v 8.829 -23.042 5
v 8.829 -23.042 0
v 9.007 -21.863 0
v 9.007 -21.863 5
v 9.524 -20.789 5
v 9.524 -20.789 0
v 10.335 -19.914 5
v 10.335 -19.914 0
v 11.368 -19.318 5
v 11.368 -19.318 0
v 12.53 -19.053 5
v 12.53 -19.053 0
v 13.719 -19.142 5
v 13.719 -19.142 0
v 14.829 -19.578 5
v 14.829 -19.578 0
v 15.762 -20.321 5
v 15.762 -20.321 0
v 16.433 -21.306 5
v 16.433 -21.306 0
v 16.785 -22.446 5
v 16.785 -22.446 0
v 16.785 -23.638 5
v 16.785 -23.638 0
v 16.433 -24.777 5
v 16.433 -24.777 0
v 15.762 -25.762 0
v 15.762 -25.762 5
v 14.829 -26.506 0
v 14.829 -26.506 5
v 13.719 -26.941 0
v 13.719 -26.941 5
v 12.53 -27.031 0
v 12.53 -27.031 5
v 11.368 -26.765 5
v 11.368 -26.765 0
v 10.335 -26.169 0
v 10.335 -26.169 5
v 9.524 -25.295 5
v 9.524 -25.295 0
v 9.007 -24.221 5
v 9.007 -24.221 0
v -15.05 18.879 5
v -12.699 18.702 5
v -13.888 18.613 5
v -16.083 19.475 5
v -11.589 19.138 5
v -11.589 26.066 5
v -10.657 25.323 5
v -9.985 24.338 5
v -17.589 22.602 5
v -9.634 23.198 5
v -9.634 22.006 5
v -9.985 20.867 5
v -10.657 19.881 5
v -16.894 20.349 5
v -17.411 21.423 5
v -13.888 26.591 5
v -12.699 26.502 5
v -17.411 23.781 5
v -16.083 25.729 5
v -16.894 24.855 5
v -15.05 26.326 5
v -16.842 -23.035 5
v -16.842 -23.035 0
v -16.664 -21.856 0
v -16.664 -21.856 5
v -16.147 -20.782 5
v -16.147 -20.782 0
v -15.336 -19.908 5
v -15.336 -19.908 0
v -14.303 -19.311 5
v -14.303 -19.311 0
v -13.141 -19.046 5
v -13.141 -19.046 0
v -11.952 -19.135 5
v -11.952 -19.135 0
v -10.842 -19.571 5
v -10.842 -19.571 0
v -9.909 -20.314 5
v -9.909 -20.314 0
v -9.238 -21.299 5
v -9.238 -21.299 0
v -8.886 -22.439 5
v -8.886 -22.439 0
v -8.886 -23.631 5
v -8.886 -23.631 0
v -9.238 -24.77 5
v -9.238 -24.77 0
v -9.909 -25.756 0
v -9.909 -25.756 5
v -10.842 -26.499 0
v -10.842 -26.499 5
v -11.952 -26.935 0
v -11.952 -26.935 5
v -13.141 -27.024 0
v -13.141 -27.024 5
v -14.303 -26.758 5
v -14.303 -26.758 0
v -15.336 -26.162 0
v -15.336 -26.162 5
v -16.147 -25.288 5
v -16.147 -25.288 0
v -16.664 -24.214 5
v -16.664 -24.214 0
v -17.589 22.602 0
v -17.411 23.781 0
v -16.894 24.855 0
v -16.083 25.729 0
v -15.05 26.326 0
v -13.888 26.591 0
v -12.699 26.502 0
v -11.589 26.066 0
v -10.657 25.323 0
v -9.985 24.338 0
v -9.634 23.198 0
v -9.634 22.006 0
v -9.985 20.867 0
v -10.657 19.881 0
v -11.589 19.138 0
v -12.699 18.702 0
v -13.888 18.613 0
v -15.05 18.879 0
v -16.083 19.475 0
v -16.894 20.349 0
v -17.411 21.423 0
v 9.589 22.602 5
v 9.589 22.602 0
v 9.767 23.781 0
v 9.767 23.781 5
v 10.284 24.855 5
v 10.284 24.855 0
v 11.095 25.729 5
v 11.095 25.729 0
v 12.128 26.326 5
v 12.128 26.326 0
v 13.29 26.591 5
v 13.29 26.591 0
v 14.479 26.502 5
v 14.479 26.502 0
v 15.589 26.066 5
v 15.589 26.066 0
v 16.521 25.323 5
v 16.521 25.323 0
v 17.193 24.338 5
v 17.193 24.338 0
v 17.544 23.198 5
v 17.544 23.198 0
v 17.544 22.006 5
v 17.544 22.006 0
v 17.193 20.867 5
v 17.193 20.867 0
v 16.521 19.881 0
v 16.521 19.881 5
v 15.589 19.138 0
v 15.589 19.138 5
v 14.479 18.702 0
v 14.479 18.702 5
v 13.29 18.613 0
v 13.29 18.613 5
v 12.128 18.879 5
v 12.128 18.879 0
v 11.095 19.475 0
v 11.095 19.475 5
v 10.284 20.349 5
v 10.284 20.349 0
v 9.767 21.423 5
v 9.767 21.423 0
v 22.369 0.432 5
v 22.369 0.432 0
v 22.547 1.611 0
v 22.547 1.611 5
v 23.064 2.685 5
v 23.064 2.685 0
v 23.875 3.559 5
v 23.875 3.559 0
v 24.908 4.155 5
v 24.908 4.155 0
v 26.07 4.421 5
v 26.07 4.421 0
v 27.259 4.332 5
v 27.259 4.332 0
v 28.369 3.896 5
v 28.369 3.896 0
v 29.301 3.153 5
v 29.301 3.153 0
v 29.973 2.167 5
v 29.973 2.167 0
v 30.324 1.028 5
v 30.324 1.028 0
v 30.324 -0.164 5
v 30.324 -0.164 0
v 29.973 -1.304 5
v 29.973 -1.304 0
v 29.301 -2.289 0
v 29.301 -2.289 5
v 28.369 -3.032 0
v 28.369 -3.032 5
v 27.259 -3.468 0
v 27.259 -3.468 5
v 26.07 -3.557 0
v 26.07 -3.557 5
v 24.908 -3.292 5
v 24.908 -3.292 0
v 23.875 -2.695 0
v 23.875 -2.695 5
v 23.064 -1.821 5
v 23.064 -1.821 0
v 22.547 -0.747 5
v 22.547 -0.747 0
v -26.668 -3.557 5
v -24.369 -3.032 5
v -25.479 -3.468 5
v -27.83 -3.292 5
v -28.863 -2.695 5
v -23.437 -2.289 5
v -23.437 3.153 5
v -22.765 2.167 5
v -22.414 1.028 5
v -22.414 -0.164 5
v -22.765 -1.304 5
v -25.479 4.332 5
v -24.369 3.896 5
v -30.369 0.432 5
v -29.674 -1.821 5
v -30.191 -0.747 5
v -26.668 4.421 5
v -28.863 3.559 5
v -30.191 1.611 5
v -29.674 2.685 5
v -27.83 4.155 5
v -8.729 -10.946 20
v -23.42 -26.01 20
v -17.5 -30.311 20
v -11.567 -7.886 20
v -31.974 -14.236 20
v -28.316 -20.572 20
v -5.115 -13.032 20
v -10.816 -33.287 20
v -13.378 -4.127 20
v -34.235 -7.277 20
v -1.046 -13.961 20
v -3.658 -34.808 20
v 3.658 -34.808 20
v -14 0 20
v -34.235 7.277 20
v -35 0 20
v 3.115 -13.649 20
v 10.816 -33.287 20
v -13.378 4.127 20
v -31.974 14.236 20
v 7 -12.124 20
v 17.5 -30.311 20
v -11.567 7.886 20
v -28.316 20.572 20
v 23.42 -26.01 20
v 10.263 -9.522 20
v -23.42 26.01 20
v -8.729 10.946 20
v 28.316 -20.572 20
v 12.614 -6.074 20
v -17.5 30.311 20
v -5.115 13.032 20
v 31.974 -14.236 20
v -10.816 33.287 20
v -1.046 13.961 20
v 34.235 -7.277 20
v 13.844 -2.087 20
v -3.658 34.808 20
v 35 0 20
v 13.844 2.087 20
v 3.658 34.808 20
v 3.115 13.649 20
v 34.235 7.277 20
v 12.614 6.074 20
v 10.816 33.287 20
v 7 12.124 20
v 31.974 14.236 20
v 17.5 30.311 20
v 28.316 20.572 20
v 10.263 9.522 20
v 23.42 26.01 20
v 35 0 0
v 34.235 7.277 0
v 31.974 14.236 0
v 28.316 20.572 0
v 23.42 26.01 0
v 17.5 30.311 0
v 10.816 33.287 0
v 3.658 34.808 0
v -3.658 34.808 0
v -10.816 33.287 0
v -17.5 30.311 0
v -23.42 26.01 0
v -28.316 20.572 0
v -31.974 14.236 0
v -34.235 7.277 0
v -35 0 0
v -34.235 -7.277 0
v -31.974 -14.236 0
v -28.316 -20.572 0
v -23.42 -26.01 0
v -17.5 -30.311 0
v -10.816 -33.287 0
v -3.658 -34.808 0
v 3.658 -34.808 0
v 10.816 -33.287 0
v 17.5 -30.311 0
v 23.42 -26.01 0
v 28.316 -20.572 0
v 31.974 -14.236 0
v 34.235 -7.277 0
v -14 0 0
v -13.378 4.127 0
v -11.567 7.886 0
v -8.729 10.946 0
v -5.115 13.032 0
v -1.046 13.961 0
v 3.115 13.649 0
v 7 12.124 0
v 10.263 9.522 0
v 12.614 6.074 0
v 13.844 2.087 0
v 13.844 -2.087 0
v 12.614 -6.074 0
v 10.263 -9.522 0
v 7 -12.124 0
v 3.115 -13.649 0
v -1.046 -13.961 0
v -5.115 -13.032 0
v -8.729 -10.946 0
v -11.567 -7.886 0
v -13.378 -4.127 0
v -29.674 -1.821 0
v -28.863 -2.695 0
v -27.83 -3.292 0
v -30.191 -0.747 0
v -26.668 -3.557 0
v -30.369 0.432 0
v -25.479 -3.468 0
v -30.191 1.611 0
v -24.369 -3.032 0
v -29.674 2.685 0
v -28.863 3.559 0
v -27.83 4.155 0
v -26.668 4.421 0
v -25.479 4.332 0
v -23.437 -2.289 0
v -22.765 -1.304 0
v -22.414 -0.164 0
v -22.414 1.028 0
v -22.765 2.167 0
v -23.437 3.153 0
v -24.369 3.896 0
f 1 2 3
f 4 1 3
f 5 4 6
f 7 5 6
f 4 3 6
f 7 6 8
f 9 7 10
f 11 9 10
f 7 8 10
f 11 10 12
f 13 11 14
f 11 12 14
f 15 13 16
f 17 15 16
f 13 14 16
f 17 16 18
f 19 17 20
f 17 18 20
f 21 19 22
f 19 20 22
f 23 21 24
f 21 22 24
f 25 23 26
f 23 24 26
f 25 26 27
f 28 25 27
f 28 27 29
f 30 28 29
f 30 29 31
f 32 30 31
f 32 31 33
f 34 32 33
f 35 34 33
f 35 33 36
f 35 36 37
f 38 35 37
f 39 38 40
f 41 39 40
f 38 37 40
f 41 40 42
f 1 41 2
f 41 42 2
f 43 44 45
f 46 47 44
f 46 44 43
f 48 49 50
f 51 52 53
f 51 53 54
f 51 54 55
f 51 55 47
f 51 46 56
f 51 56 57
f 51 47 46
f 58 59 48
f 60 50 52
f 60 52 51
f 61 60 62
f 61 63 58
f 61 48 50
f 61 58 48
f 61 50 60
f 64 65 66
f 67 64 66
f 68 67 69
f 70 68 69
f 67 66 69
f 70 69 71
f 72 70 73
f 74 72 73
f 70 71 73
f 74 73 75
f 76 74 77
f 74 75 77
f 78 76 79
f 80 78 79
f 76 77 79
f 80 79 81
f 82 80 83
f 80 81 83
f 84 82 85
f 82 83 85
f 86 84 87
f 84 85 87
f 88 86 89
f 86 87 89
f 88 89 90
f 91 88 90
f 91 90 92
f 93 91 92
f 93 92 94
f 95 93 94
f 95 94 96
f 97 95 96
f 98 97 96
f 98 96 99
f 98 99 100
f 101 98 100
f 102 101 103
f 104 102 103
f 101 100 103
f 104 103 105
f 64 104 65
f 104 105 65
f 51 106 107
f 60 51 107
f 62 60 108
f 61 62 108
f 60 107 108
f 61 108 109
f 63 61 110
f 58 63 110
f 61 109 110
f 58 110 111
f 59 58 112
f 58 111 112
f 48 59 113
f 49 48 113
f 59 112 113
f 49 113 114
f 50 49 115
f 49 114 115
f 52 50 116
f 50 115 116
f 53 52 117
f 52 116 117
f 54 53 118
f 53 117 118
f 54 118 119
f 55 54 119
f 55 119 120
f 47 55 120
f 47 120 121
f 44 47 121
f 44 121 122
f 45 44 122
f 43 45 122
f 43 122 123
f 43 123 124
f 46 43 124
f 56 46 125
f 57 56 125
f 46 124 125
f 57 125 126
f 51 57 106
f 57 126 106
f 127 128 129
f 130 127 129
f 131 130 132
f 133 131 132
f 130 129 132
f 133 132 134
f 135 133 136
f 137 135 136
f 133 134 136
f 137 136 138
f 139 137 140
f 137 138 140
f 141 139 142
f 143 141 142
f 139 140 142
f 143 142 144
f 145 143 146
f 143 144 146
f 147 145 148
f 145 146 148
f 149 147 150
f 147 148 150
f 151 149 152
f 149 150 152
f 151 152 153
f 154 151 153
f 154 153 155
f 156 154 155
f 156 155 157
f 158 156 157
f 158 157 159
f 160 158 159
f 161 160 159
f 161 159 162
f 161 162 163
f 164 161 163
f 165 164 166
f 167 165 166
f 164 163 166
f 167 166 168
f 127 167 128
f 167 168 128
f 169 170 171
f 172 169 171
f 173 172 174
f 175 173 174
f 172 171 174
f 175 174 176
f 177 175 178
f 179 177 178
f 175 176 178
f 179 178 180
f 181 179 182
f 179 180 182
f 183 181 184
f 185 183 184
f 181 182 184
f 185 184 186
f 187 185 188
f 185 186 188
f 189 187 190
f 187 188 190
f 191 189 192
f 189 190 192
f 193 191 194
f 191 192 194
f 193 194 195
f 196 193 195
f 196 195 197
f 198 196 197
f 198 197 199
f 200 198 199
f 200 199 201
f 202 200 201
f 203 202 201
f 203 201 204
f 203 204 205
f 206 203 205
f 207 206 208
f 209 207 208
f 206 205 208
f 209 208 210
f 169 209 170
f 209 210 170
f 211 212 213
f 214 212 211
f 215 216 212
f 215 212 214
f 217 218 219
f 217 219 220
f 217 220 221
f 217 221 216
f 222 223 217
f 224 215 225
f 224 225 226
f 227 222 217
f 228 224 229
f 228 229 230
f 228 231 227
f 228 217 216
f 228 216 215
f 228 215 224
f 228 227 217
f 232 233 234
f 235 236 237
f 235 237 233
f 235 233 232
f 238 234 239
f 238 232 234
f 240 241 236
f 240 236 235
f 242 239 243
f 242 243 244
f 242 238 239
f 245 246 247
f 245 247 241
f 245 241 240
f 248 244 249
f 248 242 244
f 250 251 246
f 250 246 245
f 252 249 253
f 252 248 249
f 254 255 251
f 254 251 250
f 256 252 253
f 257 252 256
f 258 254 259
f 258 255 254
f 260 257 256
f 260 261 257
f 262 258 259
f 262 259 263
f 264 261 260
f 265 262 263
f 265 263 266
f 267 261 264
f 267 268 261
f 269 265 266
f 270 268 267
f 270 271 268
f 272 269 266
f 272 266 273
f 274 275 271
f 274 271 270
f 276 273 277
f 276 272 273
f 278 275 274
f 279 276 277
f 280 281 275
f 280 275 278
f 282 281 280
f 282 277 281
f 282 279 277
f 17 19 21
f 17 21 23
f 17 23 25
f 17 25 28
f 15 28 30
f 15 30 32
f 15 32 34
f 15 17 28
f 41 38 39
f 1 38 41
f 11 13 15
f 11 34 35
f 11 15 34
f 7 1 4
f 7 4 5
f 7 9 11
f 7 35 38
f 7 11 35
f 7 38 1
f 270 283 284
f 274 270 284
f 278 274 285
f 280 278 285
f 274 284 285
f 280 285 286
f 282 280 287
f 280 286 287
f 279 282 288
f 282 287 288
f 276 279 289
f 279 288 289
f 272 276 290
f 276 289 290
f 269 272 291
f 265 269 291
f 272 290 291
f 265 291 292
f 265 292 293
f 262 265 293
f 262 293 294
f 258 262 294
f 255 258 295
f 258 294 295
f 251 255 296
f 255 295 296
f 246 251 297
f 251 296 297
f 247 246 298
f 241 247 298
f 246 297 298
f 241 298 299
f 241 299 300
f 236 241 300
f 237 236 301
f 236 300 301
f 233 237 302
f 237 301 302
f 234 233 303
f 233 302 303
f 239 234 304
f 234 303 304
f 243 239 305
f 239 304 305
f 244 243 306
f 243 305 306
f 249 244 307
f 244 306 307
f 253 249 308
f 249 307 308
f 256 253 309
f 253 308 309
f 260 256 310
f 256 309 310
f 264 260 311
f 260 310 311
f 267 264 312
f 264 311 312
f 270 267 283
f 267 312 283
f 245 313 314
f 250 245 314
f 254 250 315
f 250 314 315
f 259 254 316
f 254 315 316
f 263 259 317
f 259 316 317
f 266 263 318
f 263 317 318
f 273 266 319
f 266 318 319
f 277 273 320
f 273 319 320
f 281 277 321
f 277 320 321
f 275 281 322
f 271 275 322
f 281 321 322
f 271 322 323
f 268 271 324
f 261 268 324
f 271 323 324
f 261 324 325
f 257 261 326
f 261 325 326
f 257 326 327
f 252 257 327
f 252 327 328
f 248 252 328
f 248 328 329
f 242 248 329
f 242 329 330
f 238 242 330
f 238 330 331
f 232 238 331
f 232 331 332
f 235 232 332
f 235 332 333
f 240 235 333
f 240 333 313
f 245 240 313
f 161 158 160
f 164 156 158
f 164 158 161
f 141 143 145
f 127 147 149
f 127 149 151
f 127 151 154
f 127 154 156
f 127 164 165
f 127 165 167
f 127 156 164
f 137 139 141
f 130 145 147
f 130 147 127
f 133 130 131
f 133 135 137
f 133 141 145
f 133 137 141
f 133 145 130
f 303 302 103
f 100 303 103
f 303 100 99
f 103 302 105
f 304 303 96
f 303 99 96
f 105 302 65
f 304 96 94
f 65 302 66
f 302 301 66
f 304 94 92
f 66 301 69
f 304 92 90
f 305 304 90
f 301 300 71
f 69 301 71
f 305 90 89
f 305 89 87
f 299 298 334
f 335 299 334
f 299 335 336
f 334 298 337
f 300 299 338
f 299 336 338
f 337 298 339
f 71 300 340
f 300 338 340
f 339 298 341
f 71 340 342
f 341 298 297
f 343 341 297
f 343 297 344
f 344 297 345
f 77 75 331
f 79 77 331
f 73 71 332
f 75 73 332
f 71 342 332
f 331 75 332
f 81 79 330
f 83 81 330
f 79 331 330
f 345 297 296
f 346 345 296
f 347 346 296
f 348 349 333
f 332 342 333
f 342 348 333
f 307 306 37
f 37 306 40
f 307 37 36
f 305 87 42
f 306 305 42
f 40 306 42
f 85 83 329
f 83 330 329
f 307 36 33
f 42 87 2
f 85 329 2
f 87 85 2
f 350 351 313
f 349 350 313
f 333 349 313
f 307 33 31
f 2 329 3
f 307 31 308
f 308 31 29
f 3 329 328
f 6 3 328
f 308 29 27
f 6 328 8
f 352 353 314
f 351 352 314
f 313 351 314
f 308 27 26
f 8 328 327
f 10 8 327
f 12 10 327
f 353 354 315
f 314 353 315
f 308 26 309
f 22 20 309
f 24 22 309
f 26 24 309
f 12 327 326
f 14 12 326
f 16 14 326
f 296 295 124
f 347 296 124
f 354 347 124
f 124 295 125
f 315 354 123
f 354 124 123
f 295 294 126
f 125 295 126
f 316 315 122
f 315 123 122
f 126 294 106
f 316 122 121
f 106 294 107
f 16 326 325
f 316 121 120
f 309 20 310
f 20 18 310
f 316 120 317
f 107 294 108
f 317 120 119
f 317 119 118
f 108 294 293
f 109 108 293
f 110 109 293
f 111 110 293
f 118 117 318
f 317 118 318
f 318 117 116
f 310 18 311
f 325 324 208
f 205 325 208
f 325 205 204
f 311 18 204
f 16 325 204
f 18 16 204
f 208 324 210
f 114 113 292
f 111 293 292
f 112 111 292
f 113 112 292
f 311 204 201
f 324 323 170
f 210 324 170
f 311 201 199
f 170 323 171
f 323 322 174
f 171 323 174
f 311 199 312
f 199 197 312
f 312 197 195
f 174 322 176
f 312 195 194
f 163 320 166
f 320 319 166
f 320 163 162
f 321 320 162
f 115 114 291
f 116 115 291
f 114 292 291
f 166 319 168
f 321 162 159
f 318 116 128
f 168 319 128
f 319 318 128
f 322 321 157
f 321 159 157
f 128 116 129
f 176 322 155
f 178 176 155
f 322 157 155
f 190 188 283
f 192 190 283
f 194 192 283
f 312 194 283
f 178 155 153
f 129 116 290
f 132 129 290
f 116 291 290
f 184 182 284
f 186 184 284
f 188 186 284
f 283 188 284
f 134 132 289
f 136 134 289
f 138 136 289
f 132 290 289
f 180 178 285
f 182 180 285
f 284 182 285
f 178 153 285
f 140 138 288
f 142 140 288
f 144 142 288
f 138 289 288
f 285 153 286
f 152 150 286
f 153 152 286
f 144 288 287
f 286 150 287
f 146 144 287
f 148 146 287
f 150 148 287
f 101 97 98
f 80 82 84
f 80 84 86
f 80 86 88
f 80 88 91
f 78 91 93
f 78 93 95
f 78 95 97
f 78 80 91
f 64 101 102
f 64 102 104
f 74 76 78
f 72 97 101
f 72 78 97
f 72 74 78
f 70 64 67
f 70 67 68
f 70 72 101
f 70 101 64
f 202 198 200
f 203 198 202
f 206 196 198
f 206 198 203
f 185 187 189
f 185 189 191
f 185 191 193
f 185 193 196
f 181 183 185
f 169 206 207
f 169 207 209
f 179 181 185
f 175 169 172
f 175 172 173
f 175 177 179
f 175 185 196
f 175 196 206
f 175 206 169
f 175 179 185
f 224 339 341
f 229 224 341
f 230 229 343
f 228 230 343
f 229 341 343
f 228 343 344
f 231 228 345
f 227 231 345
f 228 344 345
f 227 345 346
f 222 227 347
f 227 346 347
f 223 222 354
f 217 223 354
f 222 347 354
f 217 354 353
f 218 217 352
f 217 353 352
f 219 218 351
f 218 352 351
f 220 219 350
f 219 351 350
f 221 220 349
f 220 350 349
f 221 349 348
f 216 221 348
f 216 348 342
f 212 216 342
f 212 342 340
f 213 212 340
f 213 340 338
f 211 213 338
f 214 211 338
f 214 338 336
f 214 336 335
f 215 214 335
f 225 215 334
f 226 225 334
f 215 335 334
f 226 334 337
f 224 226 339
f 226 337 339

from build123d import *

# Parameters (mm, degrees)
ESQUISSE1_R             = 35
ESQUISSE1_R_2           = 7
BOSS_EXTRU_1_DEPTH      = 20
ESQUISSE2_R             = 14
ENL_V_MAT_EXTRU_1_DEPTH = 5
ESQUISSE3_R             = 4
ENL_V_MAT_EXTRU_3_DEPTH = 5
ESQUISSE8_R             = 14
ENL_V_MAT_EXTRU_4_DEPTH = 25


with BuildPart() as part:
    # Esquisse1 → Boss.-Extru.1 (new body)
    with BuildSketch(Plane.XY):
        Circle(ESQUISSE1_R)
        Circle(ESQUISSE1_R_2, mode=Mode.SUBTRACT)
    extrude(amount=BOSS_EXTRU_1_DEPTH)

    # Esquisse2 → Enlèv. mat.-Extru.1 (cut)
    with BuildSketch(Plane(origin=(0, 0, 0), x_dir=(-1, 0, 0), z_dir=(0, 0, -1))):
        Circle(ESQUISSE2_R)
    extrude(amount=-ENL_V_MAT_EXTRU_1_DEPTH, mode=Mode.SUBTRACT)

    # Esquisse3 → Enlèv. mat.-Extru.3 (cut)
    with BuildSketch(Plane(origin=(0, 0, 0), x_dir=(-1, 0, 0), z_dir=(0, 0, -1))):
        with Locations((-13.588993608, 22.602101614)):
            Circle(ESQUISSE3_R)
        with Locations((13.588993608, 22.602101614)):
            Circle(ESQUISSE3_R)
        with Locations((26.369096609, 0.431843358)):
            Circle(ESQUISSE3_R)
        with Locations((12.841601354, -23.034952123)):
            Circle(ESQUISSE3_R)
        with Locations((-12.82933858, -23.041784138)):
            Circle(ESQUISSE3_R)
        with Locations((-26.369096609, 0.431843358)):
            Circle(ESQUISSE3_R)
    extrude(amount=-ENL_V_MAT_EXTRU_3_DEPTH, mode=Mode.SUBTRACT)

    # Esquisse8 → Enlèv. mat.-Extru.4 (cut)
    with BuildSketch(Plane(origin=(0, 0, 0), x_dir=(-1, 0, 0), z_dir=(0, 0, -1))):
        Circle(ESQUISSE8_R)
    extrude(amount=-ENL_V_MAT_EXTRU_4_DEPTH, mode=Mode.SUBTRACT)


solid = part.part
